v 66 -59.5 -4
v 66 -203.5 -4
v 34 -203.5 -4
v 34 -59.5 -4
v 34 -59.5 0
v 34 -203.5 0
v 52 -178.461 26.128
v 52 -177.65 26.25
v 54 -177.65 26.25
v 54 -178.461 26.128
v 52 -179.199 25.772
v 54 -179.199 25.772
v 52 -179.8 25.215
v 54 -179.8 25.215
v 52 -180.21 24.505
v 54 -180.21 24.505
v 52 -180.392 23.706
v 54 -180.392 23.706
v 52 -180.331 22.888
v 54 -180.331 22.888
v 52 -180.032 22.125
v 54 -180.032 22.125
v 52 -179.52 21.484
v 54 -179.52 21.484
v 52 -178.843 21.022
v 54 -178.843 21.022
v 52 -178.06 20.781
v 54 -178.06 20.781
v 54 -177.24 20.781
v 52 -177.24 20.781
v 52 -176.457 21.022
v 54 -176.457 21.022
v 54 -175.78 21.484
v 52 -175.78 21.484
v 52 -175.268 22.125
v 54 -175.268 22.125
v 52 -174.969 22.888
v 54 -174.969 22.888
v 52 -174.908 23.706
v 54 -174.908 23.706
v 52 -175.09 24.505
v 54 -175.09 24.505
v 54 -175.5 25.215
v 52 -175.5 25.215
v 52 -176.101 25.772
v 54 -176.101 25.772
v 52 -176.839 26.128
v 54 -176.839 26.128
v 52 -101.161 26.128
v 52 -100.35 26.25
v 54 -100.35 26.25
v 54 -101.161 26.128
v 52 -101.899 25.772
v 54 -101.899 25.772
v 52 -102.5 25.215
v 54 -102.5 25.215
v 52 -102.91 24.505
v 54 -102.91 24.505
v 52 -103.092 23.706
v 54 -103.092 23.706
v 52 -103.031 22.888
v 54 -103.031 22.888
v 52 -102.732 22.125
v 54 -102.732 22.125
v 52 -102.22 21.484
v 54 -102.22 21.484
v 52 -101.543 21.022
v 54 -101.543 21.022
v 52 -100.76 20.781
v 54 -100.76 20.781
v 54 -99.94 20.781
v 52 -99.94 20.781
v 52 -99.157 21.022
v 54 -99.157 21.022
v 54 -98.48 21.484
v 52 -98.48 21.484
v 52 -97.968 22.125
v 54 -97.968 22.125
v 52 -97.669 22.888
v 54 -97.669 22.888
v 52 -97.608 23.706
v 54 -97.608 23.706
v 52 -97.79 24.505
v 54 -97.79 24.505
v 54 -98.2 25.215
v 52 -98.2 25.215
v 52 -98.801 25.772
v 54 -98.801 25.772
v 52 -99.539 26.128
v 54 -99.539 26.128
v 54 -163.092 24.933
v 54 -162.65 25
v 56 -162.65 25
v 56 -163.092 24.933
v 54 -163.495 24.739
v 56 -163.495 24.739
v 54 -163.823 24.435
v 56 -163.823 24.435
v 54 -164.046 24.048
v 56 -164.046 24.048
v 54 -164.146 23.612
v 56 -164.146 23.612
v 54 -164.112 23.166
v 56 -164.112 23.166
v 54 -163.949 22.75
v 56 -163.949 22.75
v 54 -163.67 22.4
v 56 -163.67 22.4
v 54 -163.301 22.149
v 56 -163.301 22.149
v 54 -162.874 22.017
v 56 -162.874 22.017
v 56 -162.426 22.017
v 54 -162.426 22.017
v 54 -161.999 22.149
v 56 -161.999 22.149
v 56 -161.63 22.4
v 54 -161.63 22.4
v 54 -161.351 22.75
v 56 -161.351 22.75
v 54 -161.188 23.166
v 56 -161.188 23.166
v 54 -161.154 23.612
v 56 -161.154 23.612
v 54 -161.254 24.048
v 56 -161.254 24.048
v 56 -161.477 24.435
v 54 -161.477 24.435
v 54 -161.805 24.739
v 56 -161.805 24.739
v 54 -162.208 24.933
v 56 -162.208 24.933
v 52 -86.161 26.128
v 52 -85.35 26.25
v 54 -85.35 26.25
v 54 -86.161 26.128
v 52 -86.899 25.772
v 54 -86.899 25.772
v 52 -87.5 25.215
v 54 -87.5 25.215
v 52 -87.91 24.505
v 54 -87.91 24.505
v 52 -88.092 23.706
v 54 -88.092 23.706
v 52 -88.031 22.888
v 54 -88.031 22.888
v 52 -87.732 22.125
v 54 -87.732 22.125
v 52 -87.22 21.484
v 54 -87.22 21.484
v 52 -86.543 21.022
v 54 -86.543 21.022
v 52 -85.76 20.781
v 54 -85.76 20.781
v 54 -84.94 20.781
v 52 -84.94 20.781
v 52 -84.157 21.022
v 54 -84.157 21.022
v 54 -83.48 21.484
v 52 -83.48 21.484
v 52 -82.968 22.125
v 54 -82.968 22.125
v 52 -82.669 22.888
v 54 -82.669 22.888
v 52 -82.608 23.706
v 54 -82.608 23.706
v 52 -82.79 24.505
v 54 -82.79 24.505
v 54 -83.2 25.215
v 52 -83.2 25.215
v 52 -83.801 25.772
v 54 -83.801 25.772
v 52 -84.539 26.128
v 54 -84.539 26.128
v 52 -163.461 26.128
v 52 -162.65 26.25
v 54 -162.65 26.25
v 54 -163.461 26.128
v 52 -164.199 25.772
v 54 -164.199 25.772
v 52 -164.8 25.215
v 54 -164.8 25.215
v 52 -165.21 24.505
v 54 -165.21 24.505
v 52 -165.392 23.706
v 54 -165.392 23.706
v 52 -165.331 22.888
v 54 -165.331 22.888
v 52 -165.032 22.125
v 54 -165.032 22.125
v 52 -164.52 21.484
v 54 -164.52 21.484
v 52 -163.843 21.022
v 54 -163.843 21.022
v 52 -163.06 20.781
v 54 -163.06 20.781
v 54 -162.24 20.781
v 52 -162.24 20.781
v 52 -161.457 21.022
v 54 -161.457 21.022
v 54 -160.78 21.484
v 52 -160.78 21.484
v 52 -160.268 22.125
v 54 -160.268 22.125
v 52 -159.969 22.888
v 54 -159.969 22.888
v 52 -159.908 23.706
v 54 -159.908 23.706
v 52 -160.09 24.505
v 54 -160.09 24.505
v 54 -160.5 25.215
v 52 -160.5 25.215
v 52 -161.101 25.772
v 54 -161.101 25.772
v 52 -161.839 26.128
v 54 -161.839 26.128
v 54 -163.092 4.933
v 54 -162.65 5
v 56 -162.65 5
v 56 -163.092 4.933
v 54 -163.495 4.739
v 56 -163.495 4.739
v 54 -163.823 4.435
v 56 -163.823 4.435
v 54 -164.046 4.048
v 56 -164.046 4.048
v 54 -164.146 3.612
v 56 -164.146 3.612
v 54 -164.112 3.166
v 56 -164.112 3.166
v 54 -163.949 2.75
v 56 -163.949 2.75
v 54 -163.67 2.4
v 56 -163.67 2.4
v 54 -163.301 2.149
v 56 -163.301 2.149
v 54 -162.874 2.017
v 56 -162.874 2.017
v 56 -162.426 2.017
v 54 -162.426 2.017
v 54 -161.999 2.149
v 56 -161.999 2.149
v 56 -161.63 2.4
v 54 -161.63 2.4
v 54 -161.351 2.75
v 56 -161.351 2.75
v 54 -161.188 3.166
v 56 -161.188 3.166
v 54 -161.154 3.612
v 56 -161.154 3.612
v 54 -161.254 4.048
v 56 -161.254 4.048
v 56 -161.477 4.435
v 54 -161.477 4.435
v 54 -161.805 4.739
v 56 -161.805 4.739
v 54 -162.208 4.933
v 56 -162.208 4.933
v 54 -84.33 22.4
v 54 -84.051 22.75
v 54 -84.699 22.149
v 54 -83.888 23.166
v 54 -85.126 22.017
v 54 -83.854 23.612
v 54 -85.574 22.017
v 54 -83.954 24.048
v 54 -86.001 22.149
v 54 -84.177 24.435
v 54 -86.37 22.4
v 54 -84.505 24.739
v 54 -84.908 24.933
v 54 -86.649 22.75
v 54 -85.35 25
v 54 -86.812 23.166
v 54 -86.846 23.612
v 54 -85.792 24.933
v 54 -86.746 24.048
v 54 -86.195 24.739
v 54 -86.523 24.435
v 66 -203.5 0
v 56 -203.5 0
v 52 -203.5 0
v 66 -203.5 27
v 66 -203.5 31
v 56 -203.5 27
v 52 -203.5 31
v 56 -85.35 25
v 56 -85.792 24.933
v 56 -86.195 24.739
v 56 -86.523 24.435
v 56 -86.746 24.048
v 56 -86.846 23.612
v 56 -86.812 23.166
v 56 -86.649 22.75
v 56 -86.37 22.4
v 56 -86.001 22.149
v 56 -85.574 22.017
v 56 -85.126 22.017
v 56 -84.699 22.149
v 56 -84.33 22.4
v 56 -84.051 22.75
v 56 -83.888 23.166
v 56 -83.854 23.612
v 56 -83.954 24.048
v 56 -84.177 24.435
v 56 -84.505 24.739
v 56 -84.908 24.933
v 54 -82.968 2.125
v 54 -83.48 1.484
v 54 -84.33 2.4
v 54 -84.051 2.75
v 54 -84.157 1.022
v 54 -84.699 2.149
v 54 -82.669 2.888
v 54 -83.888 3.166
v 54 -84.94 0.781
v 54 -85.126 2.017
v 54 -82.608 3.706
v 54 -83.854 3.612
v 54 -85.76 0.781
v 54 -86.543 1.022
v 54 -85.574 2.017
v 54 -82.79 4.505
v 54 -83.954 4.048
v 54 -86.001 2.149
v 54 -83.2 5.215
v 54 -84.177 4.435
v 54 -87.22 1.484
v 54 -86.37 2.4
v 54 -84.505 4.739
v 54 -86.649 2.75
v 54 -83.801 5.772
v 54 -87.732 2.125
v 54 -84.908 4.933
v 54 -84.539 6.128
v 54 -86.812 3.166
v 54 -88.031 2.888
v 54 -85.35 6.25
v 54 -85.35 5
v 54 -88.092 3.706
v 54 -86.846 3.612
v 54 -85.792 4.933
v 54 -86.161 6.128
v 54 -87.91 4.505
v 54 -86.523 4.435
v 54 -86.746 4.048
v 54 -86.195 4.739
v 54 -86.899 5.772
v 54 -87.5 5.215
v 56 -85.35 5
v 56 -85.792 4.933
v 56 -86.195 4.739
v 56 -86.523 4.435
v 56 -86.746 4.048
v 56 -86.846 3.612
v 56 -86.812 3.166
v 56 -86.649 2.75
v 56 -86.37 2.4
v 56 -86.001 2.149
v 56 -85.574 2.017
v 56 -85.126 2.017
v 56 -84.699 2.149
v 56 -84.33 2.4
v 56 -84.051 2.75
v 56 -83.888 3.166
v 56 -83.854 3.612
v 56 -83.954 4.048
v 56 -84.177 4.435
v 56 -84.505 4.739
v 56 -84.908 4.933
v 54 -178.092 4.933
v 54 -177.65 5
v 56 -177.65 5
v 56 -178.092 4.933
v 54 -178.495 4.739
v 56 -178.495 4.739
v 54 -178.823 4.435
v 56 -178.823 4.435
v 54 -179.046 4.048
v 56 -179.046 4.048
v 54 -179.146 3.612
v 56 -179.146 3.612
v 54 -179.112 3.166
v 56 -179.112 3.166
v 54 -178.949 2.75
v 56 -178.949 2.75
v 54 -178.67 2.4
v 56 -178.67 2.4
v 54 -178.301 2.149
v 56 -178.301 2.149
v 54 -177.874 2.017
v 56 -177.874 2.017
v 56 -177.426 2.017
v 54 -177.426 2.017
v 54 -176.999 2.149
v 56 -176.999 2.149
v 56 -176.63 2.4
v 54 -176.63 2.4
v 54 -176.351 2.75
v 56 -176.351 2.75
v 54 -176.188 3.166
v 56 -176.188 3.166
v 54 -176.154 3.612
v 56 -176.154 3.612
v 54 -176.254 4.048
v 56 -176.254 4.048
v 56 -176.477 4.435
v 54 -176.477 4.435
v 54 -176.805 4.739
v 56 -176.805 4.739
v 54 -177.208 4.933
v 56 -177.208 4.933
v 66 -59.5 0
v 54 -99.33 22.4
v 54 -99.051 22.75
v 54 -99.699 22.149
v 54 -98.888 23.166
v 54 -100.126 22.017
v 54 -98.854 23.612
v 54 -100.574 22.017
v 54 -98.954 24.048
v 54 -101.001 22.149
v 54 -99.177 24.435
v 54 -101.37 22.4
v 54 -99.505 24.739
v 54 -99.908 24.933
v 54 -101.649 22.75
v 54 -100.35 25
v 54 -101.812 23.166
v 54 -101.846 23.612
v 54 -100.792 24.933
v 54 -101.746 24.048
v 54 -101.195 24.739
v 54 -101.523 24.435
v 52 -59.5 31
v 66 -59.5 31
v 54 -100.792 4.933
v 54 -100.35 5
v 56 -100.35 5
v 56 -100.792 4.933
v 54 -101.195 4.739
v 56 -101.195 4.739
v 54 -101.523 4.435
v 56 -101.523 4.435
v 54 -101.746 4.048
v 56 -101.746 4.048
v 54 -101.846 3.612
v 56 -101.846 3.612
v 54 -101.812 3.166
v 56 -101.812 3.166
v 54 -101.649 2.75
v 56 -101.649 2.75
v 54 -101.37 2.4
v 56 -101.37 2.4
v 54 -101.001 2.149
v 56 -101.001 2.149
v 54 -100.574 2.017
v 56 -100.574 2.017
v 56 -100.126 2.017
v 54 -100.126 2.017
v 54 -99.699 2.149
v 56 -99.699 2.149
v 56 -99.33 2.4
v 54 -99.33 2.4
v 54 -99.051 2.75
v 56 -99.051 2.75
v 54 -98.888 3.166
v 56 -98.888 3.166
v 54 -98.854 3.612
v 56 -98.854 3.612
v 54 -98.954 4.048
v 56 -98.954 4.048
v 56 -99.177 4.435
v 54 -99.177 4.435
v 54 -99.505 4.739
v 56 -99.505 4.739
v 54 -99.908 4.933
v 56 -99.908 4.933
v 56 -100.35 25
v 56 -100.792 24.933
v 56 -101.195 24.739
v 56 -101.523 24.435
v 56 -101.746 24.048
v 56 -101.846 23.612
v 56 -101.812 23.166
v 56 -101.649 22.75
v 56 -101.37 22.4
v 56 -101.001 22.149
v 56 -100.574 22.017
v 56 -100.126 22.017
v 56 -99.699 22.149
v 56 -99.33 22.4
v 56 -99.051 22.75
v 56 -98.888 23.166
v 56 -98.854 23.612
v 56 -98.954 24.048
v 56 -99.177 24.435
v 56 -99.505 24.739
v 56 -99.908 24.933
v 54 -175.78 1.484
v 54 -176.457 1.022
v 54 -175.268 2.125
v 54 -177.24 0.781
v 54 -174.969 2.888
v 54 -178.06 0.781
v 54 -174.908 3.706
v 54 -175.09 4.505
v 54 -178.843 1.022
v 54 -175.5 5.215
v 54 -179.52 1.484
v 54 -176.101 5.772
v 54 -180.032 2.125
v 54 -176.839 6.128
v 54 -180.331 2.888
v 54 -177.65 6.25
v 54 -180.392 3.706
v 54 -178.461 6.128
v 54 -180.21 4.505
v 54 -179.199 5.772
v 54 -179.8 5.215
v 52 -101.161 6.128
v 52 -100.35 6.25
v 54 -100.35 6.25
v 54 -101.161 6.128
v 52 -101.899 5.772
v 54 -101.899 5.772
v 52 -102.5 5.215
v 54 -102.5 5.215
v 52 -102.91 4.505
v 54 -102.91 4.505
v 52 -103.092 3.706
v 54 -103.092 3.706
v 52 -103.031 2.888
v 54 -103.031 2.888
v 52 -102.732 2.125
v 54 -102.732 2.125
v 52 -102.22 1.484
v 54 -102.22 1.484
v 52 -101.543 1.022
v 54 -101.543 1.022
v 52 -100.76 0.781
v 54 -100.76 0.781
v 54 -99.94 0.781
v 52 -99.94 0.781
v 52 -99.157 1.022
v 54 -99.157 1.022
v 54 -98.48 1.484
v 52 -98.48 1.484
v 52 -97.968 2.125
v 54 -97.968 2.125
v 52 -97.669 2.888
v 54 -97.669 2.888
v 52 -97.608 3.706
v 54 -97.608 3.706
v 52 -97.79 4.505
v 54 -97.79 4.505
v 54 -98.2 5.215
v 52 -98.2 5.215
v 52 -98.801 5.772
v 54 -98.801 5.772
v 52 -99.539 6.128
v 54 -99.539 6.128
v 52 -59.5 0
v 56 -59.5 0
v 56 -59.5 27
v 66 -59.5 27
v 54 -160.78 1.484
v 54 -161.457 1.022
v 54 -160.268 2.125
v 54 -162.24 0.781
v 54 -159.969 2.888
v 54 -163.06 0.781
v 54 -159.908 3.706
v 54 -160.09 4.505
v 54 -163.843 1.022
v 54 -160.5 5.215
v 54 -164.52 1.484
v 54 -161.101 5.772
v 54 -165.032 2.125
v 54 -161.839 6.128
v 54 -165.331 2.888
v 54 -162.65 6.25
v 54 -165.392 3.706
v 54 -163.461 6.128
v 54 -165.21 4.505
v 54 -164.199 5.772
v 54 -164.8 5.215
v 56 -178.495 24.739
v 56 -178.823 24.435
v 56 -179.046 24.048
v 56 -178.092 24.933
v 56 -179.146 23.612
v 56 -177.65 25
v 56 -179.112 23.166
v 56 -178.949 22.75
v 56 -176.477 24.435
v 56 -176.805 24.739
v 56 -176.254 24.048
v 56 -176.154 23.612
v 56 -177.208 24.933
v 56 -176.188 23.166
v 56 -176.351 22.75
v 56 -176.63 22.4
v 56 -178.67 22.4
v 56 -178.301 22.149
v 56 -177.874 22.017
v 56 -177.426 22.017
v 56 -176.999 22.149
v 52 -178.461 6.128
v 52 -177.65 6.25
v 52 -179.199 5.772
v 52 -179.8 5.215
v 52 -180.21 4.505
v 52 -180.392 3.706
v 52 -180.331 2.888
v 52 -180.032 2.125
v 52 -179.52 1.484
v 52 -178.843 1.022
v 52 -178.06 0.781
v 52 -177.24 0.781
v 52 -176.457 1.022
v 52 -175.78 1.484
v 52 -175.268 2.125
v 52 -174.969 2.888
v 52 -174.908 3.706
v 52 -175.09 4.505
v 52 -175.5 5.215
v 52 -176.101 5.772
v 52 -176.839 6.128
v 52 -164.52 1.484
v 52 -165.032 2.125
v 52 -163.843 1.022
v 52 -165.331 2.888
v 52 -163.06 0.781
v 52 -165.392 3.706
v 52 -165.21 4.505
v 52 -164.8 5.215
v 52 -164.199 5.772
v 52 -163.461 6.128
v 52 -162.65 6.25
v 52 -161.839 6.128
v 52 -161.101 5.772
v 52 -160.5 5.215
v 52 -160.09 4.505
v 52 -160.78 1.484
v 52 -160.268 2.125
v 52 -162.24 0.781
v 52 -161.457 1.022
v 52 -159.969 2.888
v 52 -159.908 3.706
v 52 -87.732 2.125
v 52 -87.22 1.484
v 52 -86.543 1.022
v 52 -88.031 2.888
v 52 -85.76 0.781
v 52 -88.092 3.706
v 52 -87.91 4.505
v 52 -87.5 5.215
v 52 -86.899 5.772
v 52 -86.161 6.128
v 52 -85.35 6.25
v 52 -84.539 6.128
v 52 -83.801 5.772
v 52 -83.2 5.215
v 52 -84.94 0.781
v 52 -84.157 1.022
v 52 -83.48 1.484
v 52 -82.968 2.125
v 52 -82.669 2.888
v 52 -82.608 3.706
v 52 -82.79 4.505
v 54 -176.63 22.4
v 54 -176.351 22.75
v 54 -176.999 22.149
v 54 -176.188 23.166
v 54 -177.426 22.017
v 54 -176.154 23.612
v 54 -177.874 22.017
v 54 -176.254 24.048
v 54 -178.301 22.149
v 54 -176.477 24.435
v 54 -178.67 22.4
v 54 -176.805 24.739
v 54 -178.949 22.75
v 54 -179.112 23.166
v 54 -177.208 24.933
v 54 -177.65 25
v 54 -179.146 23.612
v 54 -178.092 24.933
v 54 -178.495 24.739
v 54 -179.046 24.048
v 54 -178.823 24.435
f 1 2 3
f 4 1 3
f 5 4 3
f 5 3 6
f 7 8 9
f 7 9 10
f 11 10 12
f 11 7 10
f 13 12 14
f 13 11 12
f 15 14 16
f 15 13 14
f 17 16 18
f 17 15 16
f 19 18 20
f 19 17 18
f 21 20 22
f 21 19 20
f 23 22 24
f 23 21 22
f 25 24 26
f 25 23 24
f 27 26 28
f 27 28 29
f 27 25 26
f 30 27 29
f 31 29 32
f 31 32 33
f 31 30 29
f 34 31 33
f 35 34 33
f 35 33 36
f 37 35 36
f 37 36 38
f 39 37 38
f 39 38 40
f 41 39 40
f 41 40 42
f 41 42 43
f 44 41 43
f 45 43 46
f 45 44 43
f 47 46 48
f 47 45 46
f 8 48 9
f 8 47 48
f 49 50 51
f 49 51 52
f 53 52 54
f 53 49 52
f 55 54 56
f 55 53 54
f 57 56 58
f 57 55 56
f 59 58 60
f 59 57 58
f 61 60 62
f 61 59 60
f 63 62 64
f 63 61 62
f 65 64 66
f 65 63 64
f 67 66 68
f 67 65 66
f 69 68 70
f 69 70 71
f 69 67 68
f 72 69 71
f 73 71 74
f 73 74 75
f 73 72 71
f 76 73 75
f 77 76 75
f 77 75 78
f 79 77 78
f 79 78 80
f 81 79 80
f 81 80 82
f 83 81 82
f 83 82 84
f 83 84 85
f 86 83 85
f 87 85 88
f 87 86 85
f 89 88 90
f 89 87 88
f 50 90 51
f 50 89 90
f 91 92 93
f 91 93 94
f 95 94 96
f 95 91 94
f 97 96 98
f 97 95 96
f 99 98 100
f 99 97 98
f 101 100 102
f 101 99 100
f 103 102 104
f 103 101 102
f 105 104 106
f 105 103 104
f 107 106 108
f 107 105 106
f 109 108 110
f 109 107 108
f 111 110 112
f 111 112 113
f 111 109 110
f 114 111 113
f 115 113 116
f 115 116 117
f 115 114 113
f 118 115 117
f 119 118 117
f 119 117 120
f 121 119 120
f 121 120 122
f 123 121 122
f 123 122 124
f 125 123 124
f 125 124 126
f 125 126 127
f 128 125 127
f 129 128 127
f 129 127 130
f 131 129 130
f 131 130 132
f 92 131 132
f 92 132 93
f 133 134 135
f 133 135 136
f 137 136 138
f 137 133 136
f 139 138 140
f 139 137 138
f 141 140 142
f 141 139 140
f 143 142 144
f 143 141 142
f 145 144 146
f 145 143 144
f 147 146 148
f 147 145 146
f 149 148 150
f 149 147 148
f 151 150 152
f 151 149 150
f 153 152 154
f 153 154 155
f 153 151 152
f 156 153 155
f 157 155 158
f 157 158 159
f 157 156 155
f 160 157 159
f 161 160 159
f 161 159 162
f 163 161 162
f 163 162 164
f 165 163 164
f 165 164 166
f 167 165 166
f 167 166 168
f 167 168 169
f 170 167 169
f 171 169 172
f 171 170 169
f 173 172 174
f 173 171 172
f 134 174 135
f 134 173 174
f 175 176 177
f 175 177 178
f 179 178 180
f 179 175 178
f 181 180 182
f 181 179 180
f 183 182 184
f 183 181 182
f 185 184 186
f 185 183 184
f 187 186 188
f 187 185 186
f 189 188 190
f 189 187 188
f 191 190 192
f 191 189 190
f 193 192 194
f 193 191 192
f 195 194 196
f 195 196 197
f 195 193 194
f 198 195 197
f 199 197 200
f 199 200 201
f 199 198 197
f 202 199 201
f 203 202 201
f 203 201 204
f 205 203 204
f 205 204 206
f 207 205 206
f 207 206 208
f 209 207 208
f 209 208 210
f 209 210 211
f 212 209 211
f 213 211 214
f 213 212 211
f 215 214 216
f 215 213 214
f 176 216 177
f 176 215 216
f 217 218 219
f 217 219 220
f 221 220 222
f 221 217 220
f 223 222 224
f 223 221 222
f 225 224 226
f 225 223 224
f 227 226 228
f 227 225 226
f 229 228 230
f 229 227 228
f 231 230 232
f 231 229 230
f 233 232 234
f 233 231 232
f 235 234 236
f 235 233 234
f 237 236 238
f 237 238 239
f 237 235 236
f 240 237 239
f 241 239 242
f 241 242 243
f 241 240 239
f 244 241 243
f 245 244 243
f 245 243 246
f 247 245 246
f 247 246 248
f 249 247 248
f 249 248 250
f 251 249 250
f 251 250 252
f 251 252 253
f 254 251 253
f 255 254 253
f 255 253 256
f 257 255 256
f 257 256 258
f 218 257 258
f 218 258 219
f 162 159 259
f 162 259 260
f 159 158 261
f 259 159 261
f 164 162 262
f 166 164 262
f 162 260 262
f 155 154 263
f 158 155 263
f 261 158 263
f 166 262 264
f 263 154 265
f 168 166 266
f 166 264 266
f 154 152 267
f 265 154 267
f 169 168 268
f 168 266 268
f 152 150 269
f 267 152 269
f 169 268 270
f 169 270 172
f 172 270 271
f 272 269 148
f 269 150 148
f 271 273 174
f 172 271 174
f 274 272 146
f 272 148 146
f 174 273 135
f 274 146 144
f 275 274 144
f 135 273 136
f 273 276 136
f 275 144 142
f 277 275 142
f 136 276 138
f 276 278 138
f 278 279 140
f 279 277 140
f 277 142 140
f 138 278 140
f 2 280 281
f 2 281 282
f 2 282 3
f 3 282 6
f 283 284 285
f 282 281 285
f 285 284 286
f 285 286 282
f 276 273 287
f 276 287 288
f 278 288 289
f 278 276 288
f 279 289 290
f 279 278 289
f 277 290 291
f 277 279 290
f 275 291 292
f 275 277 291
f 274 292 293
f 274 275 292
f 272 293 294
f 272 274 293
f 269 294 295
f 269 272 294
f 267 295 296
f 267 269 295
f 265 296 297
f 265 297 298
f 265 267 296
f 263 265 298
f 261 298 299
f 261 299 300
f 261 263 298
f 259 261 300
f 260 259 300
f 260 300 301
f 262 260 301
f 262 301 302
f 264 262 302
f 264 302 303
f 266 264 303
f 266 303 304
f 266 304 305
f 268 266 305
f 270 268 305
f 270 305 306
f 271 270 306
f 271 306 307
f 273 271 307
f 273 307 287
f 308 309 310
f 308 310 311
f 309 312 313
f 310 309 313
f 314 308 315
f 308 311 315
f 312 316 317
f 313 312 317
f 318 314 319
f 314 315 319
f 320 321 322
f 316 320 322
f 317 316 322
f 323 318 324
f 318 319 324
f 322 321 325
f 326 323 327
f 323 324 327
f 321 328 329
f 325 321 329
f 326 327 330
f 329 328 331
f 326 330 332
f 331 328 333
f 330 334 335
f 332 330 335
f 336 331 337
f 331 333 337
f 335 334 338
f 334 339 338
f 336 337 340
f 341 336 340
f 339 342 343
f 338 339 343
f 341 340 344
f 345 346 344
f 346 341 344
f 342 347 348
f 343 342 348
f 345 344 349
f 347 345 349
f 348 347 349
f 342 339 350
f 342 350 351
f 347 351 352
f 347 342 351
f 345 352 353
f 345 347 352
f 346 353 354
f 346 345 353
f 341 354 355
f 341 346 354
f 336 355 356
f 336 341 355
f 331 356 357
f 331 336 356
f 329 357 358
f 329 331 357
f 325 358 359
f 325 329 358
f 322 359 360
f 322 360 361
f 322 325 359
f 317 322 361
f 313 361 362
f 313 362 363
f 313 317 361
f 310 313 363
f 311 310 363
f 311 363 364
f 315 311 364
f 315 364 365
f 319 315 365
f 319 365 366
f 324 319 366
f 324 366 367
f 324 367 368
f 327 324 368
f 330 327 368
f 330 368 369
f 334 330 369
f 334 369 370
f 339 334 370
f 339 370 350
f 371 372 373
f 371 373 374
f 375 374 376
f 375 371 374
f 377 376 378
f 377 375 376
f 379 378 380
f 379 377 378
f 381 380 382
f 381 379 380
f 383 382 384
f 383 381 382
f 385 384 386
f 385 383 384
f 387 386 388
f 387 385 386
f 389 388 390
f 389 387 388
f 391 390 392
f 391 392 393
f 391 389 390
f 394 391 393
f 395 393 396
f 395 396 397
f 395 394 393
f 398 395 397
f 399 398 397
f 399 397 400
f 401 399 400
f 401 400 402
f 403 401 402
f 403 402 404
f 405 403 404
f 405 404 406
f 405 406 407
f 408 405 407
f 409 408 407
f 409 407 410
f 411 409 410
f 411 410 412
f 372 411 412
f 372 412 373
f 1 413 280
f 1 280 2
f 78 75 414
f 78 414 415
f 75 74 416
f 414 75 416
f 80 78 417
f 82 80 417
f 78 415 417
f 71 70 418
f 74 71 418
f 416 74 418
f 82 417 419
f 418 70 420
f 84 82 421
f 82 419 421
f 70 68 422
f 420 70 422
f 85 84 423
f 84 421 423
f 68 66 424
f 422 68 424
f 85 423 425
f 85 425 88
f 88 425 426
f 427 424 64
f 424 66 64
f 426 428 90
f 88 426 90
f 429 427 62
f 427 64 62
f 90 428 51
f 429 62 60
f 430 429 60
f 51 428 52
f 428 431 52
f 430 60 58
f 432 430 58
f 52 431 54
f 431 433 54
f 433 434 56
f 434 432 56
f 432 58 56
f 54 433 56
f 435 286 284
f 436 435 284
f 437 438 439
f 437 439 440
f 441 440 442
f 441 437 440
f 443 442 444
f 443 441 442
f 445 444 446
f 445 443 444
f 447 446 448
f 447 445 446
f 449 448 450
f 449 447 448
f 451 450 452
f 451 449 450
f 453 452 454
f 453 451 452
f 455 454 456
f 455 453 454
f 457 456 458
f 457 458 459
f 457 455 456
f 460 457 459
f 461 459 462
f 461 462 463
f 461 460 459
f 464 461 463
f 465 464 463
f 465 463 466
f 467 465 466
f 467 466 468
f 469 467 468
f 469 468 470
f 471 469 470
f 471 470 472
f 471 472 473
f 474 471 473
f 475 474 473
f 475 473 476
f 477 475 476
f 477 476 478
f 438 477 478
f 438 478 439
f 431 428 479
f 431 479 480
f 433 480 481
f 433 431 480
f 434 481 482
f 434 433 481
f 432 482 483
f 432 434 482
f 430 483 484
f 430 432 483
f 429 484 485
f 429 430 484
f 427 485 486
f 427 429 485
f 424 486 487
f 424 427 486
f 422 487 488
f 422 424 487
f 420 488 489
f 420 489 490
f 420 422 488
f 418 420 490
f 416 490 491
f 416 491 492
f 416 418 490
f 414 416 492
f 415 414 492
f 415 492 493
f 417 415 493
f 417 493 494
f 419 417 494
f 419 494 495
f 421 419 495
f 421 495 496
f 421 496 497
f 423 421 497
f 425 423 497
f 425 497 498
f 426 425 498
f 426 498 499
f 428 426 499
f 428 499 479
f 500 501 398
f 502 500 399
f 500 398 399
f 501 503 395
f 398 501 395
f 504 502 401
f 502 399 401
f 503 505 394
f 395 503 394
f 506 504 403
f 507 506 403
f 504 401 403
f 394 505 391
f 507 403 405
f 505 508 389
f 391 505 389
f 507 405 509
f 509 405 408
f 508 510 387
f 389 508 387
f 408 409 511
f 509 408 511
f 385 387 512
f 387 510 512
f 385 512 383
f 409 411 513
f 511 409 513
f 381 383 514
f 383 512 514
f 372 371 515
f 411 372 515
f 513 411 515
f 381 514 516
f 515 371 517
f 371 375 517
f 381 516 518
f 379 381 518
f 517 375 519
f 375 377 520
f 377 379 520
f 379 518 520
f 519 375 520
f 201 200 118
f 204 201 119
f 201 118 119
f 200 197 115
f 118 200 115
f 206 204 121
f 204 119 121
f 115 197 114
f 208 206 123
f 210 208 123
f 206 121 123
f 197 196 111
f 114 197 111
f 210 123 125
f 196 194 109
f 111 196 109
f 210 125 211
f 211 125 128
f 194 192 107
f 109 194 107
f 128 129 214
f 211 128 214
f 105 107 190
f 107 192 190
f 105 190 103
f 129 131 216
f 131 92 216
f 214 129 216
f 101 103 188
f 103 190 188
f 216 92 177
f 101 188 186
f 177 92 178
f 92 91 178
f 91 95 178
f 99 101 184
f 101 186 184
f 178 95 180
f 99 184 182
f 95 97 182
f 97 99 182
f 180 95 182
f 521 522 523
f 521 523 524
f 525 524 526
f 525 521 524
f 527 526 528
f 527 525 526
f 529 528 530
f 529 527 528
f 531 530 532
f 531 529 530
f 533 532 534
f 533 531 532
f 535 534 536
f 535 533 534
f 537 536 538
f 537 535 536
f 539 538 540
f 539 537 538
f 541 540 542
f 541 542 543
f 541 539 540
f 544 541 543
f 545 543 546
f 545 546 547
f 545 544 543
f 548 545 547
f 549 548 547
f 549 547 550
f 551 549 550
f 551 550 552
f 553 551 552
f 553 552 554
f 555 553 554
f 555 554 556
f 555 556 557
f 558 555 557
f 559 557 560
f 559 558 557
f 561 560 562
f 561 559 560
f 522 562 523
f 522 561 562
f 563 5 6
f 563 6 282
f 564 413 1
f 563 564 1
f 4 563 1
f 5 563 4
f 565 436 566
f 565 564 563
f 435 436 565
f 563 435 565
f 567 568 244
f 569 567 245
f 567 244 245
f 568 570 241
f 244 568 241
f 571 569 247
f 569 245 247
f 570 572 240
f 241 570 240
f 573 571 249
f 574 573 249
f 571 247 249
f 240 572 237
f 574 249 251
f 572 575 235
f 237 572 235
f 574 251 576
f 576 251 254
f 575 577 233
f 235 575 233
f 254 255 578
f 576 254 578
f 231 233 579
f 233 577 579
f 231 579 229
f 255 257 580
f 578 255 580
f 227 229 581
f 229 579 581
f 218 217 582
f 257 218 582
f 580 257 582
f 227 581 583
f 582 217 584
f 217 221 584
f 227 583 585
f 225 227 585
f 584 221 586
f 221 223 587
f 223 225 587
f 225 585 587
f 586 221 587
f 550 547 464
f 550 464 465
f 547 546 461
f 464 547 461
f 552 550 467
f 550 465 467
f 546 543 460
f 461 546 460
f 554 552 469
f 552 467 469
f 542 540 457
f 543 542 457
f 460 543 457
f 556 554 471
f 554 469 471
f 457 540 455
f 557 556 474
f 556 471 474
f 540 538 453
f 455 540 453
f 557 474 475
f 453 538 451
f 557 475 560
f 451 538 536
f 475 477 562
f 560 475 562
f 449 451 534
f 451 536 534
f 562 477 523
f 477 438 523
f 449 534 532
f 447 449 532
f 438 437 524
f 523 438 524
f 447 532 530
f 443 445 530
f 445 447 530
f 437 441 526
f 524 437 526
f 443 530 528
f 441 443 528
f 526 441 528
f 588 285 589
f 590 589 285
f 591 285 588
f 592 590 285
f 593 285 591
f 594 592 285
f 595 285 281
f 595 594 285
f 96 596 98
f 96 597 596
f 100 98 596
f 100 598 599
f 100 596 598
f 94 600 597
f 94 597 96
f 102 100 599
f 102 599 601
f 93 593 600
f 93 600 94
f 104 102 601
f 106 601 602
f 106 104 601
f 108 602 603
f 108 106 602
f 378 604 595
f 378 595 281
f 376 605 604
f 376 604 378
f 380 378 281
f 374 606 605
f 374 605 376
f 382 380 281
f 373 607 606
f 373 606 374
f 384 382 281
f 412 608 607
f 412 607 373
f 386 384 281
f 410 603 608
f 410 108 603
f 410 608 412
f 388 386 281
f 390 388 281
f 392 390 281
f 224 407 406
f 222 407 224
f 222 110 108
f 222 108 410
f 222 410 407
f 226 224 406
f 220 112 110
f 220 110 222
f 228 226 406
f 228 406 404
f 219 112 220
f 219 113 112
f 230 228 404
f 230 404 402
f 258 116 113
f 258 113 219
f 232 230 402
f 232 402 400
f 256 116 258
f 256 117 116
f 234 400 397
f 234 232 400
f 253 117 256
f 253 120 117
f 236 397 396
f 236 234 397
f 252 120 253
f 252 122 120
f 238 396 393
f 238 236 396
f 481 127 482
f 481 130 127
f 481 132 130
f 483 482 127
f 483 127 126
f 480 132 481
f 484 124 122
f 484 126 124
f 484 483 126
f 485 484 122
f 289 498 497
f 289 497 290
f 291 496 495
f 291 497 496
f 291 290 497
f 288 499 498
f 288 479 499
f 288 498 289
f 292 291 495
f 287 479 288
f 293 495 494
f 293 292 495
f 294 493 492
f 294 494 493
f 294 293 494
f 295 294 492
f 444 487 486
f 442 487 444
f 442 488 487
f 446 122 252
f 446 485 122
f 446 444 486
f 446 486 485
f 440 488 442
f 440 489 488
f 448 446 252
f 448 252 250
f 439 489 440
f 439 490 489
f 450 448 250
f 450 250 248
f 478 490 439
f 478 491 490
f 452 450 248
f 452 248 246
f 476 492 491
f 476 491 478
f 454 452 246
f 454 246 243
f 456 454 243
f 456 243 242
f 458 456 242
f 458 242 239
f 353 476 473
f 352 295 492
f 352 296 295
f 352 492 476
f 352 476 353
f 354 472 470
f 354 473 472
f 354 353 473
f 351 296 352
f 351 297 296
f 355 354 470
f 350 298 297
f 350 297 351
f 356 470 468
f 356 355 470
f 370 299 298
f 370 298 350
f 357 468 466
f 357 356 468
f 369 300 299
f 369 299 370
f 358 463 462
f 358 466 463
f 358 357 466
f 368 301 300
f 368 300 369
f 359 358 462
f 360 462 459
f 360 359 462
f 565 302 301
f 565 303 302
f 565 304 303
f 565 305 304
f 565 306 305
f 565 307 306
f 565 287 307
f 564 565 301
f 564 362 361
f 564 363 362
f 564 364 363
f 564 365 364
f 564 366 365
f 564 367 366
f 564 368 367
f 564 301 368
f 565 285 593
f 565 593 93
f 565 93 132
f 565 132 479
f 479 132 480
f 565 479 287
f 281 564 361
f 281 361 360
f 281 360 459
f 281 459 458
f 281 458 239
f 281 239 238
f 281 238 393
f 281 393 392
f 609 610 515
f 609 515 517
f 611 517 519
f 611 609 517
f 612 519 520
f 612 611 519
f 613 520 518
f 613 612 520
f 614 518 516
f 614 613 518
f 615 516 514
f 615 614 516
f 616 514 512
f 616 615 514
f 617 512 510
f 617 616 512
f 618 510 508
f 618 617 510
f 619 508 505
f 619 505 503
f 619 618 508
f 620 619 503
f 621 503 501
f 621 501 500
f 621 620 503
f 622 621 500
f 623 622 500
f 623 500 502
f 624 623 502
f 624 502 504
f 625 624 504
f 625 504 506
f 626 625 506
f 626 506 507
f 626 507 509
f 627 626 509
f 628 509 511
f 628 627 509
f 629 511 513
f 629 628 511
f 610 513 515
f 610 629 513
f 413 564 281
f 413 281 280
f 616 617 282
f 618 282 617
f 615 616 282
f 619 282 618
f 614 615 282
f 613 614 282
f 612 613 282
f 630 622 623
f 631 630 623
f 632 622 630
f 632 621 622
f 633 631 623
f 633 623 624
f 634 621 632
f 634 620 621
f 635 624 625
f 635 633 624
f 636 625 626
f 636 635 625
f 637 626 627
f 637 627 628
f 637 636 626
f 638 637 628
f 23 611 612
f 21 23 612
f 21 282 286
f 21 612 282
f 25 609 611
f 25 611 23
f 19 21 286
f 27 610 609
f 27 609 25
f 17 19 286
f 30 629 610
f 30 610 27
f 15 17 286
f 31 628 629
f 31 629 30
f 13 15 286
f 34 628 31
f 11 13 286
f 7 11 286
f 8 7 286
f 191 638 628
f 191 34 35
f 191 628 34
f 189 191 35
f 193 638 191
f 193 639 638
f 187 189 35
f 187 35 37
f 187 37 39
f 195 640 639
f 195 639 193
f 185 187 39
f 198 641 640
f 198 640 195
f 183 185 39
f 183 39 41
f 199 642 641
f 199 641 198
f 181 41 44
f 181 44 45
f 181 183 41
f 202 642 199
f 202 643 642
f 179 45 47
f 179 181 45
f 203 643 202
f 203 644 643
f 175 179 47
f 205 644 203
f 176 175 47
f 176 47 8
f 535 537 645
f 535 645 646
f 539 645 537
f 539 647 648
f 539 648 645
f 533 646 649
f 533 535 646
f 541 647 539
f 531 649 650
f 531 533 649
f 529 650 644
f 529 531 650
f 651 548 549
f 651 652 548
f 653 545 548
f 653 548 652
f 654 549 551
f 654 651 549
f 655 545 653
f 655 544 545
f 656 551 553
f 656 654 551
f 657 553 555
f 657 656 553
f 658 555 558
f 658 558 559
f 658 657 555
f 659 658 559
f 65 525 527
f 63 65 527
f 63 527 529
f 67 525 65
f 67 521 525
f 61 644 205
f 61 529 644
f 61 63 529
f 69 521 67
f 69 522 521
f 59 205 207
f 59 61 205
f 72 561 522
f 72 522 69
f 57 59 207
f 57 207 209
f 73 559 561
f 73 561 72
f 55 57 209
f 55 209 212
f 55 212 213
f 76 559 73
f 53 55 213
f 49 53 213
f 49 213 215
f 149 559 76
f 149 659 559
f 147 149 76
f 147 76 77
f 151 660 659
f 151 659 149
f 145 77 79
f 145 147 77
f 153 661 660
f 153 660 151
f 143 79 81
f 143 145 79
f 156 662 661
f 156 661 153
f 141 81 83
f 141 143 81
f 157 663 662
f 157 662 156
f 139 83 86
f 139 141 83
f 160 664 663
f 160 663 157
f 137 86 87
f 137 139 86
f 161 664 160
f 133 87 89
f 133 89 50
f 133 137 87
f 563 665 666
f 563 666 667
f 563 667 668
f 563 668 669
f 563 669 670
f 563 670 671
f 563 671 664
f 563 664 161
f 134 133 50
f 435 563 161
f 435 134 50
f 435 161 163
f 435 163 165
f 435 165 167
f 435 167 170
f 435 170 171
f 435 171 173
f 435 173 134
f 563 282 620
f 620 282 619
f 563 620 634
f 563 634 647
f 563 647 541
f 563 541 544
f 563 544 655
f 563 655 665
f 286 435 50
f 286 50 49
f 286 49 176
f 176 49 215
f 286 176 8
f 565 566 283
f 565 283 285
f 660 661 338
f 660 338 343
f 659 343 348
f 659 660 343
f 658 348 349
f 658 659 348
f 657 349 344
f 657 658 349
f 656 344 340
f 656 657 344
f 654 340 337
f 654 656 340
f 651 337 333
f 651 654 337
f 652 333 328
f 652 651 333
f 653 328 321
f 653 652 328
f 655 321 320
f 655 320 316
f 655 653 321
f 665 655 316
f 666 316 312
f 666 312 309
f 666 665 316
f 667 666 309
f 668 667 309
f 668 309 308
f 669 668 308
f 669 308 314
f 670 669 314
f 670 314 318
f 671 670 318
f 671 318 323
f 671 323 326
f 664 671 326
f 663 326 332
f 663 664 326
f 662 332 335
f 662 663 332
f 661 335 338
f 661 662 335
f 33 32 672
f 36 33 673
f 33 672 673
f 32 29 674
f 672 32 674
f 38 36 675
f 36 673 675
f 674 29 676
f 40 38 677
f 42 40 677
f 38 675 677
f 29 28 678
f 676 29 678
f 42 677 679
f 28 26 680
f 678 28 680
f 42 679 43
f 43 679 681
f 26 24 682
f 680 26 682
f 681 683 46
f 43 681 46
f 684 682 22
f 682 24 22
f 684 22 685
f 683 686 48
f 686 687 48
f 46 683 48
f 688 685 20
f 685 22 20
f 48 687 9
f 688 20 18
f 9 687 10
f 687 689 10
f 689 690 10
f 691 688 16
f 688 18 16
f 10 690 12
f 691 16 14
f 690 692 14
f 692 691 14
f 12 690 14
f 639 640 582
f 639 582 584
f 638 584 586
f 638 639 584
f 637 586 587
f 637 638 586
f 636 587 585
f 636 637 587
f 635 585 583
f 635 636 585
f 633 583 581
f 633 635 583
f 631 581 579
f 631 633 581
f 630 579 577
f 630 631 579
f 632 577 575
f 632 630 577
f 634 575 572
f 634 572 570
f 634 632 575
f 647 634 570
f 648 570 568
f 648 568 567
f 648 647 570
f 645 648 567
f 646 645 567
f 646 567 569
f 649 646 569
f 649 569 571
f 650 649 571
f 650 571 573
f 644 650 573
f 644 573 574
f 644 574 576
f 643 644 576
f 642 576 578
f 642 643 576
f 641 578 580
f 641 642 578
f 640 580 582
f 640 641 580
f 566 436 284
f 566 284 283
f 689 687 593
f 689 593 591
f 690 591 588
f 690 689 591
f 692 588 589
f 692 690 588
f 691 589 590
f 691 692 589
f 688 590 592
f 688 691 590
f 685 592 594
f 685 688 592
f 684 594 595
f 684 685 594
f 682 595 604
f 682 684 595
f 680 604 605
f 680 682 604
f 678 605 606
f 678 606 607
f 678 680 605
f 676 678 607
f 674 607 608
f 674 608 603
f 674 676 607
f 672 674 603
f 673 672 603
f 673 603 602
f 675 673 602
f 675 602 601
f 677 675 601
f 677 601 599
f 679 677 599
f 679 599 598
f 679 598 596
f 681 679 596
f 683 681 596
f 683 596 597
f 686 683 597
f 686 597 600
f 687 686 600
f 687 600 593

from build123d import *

# Parameters (mm, degrees)
PAD023_DEPTH    = 144
SKETCH036_R     = 1.5
POCKET004_DEPTH = 4
SKETCH037_R     = 2.75
POCKET005_DEPTH = 2


with BuildPart() as left:
    # Sketch035 → Pad023 (new body)
    with BuildSketch(Plane.XZ):
        Polygon((0, 0), (0, -4), (10, -4), (10, -31), (0, -31), (0, -35), (32, -35), (32, -31), (14, -31), (14, -4), (14, 0), align=None)
    extrude(amount=PAD023_DEPTH)

    # Sketch036 (on Face12 of Pad023) → Pocket004 (cut)
    with BuildSketch(Plane(origin=(14, 0, 0), x_dir=(0, 0, 1), z_dir=(1, 0, 0))):
        with Locations((-7.5, 118.15)):
            Circle(SKETCH036_R)
        with Locations((-7.5, 103.15)):
            Circle(SKETCH036_R)
        with Locations((-27.5, 103.15)):
            Circle(SKETCH036_R)
        with Locations((-27.5, 118.15)):
            Circle(SKETCH036_R)
        with Locations((-27.5, 40.85)):
            Circle(SKETCH036_R)
        with Locations((-27.5, 25.85)):
            Circle(SKETCH036_R)
        with Locations((-7.5, 25.85)):
            Circle(SKETCH036_R)
        with Locations((-7.5, 40.85)):
            Circle(SKETCH036_R)
    extrude(amount=-POCKET004_DEPTH, mode=Mode.SUBTRACT)

    # Sketch037 (on Face6 of Pocket004) → Pocket005 (cut)
    with BuildSketch(Plane(origin=(14, 0, 0), x_dir=(0, 0, 1), z_dir=(1, 0, 0))):
        with Locations((-7.5, 118.15)):
            Circle(SKETCH037_R)
        with Locations((-7.5, 103.15)):
            Circle(SKETCH037_R)
        with Locations((-27.5, 103.15)):
            Circle(SKETCH037_R)
        with Locations((-27.5, 118.15)):
            Circle(SKETCH037_R)
        with Locations((-27.5, 40.85)):
            Circle(SKETCH037_R)
        with Locations((-27.5, 25.85)):
            Circle(SKETCH037_R)
        with Locations((-7.5, 25.85)):
            Circle(SKETCH037_R)
        with Locations((-7.5, 40.85)):
            Circle(SKETCH037_R)
    extrude(amount=-POCKET005_DEPTH, mode=Mode.SUBTRACT)


with BuildPart() as left_1:
    # Body011 placement: moved
    add(left.part.moved(Location((-66, -59.5, 31))))


with BuildPart() as right:
    # Part__Mirroring: instance of Left
    add(left_1.part.mirror(Plane(origin=(0, 0, 0), x_dir=(0, -1, 0), z_dir=(1, 0, 0))))


solid = right.part
